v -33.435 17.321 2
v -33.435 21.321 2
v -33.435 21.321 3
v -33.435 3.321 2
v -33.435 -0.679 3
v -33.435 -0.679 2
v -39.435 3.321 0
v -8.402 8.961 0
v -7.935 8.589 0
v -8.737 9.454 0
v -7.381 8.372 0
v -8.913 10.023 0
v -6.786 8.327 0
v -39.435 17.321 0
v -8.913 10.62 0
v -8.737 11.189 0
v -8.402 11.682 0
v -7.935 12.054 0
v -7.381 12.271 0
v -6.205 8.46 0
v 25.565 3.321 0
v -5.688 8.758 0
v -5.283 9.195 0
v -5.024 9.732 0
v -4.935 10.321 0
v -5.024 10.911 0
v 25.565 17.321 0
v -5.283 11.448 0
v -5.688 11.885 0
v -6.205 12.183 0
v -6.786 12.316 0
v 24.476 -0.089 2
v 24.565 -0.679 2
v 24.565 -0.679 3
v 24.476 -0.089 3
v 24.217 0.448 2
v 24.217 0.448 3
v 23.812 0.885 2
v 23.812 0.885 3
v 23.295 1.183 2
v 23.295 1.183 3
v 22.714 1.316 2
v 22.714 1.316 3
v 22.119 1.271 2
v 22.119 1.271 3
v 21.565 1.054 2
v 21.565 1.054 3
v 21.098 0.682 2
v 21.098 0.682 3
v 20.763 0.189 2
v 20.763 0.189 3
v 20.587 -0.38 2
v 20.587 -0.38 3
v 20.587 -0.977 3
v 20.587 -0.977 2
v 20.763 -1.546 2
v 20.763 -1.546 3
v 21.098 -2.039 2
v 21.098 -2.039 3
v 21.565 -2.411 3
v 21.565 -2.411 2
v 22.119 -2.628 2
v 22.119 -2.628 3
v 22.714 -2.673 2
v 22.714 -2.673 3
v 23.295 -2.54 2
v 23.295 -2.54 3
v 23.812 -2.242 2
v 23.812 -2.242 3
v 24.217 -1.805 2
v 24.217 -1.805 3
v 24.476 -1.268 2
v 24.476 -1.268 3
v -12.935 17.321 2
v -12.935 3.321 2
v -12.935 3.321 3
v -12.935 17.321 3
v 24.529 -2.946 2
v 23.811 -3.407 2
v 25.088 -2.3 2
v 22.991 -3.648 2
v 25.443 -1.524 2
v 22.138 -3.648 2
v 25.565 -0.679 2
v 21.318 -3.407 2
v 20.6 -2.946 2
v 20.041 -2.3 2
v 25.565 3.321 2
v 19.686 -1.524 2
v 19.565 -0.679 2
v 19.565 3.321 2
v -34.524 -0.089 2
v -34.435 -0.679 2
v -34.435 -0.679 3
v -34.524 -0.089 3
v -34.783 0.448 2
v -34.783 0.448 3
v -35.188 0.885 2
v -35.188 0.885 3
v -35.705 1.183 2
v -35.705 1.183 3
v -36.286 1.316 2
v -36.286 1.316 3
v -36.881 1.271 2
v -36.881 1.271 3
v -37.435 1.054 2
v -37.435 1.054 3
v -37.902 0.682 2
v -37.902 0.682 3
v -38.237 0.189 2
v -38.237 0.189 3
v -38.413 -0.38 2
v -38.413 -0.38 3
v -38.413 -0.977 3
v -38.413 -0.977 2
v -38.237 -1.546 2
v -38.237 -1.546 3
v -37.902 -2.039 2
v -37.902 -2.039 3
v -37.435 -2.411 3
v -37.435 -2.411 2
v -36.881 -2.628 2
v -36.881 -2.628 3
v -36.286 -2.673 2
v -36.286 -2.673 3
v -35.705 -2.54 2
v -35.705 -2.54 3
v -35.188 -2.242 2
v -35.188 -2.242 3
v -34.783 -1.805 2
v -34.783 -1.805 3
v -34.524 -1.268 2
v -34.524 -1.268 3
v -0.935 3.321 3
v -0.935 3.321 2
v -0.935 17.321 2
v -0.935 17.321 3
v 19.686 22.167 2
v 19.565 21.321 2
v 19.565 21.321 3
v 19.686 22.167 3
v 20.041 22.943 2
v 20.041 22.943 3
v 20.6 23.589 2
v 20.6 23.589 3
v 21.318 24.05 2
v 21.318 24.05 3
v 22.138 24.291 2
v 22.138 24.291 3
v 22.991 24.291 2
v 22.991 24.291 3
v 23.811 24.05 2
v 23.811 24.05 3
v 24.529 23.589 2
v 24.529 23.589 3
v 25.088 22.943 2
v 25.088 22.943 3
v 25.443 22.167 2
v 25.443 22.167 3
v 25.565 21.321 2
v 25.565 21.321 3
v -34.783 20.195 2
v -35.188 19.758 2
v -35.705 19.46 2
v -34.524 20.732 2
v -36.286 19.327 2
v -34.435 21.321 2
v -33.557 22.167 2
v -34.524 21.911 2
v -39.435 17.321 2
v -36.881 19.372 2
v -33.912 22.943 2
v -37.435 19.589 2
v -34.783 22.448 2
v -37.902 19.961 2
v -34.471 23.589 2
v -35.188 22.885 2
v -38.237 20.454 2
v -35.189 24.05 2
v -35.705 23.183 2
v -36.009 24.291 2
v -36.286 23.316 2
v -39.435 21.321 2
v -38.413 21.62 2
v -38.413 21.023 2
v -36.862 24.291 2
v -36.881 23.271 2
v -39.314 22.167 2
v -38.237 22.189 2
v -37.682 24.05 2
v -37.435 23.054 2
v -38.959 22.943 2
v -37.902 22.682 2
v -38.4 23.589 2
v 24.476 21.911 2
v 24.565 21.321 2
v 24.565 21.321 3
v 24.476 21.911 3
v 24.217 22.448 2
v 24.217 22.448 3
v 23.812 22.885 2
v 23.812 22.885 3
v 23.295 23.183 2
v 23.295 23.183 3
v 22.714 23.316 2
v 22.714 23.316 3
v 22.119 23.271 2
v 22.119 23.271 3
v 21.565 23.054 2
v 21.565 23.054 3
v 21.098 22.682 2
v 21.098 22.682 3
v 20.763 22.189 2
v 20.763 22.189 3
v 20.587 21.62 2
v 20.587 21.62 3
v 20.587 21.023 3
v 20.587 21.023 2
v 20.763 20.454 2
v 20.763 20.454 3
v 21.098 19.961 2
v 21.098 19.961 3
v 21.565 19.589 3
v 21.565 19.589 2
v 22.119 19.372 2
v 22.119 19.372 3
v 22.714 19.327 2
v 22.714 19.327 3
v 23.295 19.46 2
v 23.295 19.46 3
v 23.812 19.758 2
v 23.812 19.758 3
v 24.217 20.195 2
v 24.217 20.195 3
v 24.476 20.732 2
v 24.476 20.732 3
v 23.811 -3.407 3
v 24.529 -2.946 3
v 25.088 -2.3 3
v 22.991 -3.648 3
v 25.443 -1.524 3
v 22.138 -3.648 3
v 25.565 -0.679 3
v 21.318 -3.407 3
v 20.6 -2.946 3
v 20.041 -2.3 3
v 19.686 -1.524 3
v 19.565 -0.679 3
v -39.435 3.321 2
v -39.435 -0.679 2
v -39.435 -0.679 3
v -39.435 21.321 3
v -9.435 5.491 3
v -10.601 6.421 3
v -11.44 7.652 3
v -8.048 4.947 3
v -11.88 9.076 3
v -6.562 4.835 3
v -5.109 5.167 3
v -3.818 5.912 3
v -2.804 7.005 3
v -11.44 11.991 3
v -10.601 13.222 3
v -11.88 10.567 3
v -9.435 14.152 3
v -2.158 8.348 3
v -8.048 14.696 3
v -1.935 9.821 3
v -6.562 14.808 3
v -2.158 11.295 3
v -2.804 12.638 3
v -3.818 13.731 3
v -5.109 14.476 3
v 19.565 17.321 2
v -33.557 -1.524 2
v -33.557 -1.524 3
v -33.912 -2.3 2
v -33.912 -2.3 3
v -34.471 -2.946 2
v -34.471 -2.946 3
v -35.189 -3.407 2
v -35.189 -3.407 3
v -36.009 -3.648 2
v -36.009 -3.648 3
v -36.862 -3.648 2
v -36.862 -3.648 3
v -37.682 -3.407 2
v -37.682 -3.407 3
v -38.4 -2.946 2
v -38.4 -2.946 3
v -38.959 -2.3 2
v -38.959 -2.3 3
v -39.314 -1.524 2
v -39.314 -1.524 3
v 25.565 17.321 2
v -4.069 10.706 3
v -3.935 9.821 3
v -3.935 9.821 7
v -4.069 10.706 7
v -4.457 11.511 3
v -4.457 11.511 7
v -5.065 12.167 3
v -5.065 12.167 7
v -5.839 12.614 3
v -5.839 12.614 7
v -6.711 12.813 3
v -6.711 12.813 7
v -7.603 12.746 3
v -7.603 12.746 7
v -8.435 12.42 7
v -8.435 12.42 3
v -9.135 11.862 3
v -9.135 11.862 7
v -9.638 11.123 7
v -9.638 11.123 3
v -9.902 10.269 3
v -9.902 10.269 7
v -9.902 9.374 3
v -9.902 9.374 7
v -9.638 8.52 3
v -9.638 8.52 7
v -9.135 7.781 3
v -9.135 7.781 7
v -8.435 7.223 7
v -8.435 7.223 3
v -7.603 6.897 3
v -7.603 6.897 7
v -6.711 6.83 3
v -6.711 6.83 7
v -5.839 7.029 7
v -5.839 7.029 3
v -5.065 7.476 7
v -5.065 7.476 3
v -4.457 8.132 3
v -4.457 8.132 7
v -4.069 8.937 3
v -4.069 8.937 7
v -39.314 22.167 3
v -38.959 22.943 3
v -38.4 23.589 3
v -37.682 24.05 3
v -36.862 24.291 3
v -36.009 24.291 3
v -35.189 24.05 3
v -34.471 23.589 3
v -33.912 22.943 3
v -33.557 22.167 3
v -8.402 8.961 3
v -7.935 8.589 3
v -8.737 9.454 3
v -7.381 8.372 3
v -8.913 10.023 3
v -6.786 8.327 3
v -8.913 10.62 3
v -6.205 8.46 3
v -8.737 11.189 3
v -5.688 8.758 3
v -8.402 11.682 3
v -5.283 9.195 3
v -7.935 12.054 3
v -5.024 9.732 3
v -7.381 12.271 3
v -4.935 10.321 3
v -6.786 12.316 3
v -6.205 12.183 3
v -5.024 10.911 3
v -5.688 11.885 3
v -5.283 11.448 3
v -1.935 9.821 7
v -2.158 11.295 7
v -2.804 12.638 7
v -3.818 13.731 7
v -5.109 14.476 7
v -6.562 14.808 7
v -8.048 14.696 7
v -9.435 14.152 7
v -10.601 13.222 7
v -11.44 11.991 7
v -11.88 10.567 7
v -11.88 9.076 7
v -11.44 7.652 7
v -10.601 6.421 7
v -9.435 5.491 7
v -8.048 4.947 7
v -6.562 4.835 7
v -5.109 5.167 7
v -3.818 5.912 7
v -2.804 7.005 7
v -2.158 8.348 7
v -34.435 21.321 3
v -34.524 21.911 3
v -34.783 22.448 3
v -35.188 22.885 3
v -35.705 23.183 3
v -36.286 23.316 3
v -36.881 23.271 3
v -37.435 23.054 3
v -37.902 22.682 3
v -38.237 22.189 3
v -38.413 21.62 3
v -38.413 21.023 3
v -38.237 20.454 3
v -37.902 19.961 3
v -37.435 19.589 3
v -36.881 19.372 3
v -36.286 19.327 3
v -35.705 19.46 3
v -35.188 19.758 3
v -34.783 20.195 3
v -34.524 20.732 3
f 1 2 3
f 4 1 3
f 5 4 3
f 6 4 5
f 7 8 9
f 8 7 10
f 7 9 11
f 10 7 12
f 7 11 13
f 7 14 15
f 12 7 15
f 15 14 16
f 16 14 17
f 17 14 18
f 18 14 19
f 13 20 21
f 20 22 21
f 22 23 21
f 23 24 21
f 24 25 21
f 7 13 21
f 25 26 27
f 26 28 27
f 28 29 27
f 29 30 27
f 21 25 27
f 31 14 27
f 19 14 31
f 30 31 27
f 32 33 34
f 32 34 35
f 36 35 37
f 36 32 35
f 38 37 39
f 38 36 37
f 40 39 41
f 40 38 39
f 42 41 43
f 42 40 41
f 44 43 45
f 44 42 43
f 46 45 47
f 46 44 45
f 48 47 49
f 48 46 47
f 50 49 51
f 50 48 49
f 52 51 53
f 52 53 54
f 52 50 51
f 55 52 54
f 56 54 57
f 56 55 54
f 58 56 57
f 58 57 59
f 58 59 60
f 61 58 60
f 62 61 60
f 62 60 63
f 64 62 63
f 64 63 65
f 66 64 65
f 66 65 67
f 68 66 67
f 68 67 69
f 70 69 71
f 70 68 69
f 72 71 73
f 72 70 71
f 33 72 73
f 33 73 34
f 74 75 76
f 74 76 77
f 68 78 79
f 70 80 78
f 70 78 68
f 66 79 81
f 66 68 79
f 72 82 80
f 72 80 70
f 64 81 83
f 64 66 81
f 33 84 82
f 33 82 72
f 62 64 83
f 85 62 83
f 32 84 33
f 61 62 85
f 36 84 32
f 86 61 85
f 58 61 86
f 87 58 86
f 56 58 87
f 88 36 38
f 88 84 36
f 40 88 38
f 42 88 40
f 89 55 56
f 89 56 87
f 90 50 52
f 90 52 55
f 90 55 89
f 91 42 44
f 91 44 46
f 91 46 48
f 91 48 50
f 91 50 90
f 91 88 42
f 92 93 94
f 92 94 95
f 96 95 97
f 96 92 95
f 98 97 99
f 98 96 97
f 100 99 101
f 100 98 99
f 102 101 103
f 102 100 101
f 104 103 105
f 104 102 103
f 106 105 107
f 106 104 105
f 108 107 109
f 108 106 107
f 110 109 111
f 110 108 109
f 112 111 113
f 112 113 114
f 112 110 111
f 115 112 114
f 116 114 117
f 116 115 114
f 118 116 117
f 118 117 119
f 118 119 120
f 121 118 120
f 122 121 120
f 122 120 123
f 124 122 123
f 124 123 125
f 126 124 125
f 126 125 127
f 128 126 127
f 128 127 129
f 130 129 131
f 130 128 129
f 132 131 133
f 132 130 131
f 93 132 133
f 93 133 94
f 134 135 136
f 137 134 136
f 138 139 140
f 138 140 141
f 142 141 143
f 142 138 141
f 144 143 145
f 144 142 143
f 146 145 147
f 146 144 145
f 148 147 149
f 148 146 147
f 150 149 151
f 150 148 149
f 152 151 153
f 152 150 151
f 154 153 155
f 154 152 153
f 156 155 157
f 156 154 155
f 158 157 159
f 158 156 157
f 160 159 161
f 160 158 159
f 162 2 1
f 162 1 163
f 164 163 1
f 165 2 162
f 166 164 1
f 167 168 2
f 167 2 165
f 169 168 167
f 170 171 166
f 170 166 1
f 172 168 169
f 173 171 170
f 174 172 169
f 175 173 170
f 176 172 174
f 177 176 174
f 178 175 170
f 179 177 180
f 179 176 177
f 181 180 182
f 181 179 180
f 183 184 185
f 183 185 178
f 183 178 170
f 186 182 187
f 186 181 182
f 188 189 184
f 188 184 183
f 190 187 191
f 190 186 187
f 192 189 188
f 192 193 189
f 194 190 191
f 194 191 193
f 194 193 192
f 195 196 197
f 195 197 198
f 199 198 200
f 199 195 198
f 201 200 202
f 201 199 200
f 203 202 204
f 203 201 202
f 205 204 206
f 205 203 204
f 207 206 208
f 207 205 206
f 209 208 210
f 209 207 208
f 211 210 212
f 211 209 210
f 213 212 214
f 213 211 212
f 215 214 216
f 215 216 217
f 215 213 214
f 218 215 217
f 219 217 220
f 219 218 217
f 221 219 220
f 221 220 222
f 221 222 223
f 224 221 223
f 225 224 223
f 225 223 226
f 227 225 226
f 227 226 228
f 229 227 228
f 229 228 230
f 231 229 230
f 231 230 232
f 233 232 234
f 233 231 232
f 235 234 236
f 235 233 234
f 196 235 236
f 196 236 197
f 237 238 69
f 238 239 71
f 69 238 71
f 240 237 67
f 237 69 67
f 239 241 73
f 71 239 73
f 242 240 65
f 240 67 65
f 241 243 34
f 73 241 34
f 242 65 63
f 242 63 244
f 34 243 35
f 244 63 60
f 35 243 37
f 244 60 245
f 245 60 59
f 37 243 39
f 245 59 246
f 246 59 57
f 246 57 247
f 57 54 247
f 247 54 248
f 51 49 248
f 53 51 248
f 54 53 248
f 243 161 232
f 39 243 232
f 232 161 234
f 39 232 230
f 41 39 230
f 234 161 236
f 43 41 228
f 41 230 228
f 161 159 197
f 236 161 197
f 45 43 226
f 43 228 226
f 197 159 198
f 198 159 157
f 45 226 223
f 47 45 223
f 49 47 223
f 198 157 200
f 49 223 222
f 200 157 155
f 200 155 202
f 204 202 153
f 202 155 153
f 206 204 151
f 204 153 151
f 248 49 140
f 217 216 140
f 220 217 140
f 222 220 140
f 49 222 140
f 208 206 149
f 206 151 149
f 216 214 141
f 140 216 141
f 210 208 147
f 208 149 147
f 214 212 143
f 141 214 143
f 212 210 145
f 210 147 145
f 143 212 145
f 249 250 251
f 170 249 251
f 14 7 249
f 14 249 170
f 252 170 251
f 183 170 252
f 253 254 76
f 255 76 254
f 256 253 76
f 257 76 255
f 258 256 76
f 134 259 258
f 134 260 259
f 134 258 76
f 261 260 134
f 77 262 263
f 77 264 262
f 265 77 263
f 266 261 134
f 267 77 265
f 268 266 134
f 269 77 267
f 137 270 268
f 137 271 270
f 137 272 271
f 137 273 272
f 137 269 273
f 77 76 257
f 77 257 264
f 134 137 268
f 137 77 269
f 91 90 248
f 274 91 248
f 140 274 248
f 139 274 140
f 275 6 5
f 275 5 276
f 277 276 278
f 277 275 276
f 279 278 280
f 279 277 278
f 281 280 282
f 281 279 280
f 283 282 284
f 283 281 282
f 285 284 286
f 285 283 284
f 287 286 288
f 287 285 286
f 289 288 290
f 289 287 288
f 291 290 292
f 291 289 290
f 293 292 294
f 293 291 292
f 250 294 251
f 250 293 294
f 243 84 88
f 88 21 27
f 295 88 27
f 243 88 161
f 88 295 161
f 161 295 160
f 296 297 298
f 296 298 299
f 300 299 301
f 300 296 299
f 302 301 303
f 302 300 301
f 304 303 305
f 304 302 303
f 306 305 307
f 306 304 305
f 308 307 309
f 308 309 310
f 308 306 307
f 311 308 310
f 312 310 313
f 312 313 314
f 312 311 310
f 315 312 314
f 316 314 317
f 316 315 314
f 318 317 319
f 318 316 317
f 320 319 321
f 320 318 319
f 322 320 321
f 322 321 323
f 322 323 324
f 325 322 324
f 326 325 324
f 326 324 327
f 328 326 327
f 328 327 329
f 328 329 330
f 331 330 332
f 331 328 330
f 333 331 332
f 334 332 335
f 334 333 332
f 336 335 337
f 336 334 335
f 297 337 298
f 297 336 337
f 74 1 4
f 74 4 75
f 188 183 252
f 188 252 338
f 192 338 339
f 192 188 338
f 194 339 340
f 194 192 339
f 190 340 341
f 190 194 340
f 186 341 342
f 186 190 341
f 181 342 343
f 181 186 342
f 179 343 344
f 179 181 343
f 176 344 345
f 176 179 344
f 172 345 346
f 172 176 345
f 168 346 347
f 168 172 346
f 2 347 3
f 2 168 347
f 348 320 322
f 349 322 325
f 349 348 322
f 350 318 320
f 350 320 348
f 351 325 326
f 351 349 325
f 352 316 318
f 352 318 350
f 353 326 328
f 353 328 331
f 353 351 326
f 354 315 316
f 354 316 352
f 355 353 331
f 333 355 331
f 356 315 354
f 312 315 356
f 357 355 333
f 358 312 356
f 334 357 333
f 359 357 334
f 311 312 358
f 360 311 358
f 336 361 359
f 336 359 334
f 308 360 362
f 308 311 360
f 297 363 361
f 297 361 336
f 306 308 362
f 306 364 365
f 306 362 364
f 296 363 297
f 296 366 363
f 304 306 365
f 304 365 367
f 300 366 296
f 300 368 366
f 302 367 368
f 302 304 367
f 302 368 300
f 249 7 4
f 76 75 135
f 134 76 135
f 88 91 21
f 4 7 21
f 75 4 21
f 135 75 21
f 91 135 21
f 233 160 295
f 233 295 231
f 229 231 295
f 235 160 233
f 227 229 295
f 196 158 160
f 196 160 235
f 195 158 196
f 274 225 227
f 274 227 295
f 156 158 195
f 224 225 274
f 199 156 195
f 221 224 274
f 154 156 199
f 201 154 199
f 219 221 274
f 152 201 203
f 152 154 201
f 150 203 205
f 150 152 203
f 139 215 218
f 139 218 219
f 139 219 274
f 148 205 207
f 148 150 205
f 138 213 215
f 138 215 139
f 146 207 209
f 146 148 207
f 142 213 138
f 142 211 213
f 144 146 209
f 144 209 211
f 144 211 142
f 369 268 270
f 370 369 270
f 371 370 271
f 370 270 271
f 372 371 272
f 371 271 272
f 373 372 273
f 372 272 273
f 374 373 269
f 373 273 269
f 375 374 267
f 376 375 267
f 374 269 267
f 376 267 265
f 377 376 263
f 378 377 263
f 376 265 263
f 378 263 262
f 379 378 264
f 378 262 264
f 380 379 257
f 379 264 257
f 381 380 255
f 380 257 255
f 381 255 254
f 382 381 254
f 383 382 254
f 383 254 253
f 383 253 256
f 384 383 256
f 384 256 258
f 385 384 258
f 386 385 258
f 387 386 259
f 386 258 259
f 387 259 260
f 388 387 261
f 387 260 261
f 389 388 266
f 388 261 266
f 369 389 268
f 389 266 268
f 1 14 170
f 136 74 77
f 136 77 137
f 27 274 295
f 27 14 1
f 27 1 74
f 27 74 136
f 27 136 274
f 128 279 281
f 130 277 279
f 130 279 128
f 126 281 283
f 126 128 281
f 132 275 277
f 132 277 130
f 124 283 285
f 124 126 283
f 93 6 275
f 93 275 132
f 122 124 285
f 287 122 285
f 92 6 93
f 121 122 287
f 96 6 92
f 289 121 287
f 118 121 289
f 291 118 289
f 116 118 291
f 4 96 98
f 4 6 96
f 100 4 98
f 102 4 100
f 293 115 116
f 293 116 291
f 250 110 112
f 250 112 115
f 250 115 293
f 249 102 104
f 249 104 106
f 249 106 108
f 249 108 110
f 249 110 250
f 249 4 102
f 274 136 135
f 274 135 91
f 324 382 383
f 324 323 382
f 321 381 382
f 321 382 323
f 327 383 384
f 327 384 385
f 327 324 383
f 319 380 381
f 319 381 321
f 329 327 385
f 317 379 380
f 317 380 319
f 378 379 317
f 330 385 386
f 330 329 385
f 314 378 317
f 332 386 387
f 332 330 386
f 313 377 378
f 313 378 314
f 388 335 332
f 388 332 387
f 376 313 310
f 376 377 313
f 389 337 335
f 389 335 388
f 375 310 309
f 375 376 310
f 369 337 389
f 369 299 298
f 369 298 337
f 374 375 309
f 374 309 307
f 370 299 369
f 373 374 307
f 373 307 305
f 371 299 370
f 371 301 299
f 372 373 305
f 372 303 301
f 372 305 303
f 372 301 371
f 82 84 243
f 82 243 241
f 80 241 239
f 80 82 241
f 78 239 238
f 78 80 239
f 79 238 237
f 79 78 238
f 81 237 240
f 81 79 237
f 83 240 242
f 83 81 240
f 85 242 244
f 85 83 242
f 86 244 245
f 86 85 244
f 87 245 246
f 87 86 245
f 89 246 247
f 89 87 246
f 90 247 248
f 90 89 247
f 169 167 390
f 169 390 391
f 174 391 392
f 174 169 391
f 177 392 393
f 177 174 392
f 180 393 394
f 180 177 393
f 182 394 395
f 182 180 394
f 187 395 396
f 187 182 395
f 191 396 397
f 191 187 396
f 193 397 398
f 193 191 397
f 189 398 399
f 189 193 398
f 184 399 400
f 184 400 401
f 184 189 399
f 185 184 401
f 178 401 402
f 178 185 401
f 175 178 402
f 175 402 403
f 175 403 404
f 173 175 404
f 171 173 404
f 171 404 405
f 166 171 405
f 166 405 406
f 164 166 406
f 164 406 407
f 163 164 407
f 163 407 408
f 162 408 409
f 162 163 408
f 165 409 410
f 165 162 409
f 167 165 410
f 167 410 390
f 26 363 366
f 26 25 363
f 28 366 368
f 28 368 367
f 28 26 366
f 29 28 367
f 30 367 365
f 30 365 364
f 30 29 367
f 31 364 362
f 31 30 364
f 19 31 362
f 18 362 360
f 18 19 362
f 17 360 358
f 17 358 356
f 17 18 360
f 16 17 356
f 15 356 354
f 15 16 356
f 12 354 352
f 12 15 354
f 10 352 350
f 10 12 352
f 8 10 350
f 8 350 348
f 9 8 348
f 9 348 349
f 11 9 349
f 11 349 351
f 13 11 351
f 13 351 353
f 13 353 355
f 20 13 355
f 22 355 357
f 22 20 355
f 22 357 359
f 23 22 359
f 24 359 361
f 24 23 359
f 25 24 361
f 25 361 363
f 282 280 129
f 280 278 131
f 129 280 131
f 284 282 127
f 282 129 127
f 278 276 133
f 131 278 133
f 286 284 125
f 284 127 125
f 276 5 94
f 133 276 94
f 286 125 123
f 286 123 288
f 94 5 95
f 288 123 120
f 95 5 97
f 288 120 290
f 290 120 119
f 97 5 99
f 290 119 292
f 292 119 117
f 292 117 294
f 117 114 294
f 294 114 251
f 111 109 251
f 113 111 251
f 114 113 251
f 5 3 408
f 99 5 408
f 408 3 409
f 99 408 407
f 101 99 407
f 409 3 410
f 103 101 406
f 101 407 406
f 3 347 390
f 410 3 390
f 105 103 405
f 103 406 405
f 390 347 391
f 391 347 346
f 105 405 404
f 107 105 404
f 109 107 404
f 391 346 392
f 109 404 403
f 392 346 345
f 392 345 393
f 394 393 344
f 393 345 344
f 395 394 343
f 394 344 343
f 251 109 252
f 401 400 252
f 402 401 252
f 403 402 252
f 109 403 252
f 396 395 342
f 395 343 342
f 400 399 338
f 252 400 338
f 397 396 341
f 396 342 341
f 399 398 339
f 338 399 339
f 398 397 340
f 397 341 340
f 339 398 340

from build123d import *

# Parameters (mm, degrees)
ESBO_O1_W                = 65
ESBO_O1_H                = 14
ESBO_O1_R                = 2
RESSALTO_EXTRUS_O1_DEPTH = 2
ESBO_O2_W                = 12
ESBO_O2_H                = 14
ESBO_O2_R                = 2
RESSALTO_EXTRUS_O2_DEPTH = 1
ESBO_O3_R                = 5
ESBO_O3_R_2              = 3
RESSALTO_EXTRUS_O3_DEPTH = 4


with BuildPart() as part:
    # Esboço1 → Ressalto-extrusão1 (new body)
    with BuildSketch(Plane.XY):
        with Locations((-6.935469367, 10.321486594)):
            Rectangle(ESBO_O1_W, ESBO_O1_H)
        with Locations((-6.935469367, 10.321486594)):
            Circle(ESBO_O1_R, mode=Mode.SUBTRACT)
    extrude(amount=RESSALTO_EXTRUS_O1_DEPTH)

    # Esboço2 → Ressalto-extrusão2 (add)
    # profile 1 of 3: a face of its own
    with BuildSketch(Plane.XY.offset(2)):
        with Locations((-6.935469367, 10.321486594)):
            Rectangle(ESBO_O2_W, ESBO_O2_H)
        with Locations((-6.935469367, 10.321486594)):
            Circle(ESBO_O2_R, mode=Mode.SUBTRACT)
    # profile 2 of 3: a face of its own
    with BuildSketch(Plane.XY.offset(2)):
        with BuildLine():
            Line((-33.435469367, 21.321486594), (-33.435469367, -0.678513406))
            ThreePointArc((-33.435469367, -0.678513406), (-36.435469367, -3.678513406), (-39.435469367, -0.678513406))
            Line((-39.435469367, -0.678513406), (-39.435469367, 21.321486594))
            ThreePointArc((-39.435469367, 21.321486594), (-36.435469367, 24.321486594), (-33.435469367, 21.321486594))
        make_face()
        with Locations((-36.435469367, 21.321486594)):
            Circle(ESBO_O2_R, mode=Mode.SUBTRACT)
        with Locations((-36.435469367, -0.678513406)):
            Circle(ESBO_O2_R, mode=Mode.SUBTRACT)
    # profile 3 of 3: a face of its own
    with BuildSketch(Plane.XY.offset(2)):
        with BuildLine():
            Line((25.564530633, 21.321486594), (25.564530633, -0.678513406))
            ThreePointArc((25.564530633, -0.678513406), (22.564530633, -3.678513406), (19.564530633, -0.678513406))
            Line((19.564530633, -0.678513406), (19.564530633, 21.321486594))
            ThreePointArc((19.564530633, 21.321486594), (22.564530633, 24.321486594), (25.564530633, 21.321486594))
        make_face()
        with Locations((22.564530633, -0.678513406)):
            Circle(ESBO_O2_R, mode=Mode.SUBTRACT)
        with Locations((22.564530633, 21.321486594)):
            Circle(ESBO_O2_R, mode=Mode.SUBTRACT)
    extrude(amount=RESSALTO_EXTRUS_O2_DEPTH)

    # Esboço3 → Ressalto-extrusão3 (add)
    with BuildSketch(Plane.XY.offset(3)):
        with Locations((-6.935469367, 9.821486594)):
            Circle(ESBO_O3_R)
        with Locations((-6.935469367, 9.821486594)):
            Circle(ESBO_O3_R_2, mode=Mode.SUBTRACT)
    extrude(amount=RESSALTO_EXTRUS_O3_DEPTH)


solid = part.part
